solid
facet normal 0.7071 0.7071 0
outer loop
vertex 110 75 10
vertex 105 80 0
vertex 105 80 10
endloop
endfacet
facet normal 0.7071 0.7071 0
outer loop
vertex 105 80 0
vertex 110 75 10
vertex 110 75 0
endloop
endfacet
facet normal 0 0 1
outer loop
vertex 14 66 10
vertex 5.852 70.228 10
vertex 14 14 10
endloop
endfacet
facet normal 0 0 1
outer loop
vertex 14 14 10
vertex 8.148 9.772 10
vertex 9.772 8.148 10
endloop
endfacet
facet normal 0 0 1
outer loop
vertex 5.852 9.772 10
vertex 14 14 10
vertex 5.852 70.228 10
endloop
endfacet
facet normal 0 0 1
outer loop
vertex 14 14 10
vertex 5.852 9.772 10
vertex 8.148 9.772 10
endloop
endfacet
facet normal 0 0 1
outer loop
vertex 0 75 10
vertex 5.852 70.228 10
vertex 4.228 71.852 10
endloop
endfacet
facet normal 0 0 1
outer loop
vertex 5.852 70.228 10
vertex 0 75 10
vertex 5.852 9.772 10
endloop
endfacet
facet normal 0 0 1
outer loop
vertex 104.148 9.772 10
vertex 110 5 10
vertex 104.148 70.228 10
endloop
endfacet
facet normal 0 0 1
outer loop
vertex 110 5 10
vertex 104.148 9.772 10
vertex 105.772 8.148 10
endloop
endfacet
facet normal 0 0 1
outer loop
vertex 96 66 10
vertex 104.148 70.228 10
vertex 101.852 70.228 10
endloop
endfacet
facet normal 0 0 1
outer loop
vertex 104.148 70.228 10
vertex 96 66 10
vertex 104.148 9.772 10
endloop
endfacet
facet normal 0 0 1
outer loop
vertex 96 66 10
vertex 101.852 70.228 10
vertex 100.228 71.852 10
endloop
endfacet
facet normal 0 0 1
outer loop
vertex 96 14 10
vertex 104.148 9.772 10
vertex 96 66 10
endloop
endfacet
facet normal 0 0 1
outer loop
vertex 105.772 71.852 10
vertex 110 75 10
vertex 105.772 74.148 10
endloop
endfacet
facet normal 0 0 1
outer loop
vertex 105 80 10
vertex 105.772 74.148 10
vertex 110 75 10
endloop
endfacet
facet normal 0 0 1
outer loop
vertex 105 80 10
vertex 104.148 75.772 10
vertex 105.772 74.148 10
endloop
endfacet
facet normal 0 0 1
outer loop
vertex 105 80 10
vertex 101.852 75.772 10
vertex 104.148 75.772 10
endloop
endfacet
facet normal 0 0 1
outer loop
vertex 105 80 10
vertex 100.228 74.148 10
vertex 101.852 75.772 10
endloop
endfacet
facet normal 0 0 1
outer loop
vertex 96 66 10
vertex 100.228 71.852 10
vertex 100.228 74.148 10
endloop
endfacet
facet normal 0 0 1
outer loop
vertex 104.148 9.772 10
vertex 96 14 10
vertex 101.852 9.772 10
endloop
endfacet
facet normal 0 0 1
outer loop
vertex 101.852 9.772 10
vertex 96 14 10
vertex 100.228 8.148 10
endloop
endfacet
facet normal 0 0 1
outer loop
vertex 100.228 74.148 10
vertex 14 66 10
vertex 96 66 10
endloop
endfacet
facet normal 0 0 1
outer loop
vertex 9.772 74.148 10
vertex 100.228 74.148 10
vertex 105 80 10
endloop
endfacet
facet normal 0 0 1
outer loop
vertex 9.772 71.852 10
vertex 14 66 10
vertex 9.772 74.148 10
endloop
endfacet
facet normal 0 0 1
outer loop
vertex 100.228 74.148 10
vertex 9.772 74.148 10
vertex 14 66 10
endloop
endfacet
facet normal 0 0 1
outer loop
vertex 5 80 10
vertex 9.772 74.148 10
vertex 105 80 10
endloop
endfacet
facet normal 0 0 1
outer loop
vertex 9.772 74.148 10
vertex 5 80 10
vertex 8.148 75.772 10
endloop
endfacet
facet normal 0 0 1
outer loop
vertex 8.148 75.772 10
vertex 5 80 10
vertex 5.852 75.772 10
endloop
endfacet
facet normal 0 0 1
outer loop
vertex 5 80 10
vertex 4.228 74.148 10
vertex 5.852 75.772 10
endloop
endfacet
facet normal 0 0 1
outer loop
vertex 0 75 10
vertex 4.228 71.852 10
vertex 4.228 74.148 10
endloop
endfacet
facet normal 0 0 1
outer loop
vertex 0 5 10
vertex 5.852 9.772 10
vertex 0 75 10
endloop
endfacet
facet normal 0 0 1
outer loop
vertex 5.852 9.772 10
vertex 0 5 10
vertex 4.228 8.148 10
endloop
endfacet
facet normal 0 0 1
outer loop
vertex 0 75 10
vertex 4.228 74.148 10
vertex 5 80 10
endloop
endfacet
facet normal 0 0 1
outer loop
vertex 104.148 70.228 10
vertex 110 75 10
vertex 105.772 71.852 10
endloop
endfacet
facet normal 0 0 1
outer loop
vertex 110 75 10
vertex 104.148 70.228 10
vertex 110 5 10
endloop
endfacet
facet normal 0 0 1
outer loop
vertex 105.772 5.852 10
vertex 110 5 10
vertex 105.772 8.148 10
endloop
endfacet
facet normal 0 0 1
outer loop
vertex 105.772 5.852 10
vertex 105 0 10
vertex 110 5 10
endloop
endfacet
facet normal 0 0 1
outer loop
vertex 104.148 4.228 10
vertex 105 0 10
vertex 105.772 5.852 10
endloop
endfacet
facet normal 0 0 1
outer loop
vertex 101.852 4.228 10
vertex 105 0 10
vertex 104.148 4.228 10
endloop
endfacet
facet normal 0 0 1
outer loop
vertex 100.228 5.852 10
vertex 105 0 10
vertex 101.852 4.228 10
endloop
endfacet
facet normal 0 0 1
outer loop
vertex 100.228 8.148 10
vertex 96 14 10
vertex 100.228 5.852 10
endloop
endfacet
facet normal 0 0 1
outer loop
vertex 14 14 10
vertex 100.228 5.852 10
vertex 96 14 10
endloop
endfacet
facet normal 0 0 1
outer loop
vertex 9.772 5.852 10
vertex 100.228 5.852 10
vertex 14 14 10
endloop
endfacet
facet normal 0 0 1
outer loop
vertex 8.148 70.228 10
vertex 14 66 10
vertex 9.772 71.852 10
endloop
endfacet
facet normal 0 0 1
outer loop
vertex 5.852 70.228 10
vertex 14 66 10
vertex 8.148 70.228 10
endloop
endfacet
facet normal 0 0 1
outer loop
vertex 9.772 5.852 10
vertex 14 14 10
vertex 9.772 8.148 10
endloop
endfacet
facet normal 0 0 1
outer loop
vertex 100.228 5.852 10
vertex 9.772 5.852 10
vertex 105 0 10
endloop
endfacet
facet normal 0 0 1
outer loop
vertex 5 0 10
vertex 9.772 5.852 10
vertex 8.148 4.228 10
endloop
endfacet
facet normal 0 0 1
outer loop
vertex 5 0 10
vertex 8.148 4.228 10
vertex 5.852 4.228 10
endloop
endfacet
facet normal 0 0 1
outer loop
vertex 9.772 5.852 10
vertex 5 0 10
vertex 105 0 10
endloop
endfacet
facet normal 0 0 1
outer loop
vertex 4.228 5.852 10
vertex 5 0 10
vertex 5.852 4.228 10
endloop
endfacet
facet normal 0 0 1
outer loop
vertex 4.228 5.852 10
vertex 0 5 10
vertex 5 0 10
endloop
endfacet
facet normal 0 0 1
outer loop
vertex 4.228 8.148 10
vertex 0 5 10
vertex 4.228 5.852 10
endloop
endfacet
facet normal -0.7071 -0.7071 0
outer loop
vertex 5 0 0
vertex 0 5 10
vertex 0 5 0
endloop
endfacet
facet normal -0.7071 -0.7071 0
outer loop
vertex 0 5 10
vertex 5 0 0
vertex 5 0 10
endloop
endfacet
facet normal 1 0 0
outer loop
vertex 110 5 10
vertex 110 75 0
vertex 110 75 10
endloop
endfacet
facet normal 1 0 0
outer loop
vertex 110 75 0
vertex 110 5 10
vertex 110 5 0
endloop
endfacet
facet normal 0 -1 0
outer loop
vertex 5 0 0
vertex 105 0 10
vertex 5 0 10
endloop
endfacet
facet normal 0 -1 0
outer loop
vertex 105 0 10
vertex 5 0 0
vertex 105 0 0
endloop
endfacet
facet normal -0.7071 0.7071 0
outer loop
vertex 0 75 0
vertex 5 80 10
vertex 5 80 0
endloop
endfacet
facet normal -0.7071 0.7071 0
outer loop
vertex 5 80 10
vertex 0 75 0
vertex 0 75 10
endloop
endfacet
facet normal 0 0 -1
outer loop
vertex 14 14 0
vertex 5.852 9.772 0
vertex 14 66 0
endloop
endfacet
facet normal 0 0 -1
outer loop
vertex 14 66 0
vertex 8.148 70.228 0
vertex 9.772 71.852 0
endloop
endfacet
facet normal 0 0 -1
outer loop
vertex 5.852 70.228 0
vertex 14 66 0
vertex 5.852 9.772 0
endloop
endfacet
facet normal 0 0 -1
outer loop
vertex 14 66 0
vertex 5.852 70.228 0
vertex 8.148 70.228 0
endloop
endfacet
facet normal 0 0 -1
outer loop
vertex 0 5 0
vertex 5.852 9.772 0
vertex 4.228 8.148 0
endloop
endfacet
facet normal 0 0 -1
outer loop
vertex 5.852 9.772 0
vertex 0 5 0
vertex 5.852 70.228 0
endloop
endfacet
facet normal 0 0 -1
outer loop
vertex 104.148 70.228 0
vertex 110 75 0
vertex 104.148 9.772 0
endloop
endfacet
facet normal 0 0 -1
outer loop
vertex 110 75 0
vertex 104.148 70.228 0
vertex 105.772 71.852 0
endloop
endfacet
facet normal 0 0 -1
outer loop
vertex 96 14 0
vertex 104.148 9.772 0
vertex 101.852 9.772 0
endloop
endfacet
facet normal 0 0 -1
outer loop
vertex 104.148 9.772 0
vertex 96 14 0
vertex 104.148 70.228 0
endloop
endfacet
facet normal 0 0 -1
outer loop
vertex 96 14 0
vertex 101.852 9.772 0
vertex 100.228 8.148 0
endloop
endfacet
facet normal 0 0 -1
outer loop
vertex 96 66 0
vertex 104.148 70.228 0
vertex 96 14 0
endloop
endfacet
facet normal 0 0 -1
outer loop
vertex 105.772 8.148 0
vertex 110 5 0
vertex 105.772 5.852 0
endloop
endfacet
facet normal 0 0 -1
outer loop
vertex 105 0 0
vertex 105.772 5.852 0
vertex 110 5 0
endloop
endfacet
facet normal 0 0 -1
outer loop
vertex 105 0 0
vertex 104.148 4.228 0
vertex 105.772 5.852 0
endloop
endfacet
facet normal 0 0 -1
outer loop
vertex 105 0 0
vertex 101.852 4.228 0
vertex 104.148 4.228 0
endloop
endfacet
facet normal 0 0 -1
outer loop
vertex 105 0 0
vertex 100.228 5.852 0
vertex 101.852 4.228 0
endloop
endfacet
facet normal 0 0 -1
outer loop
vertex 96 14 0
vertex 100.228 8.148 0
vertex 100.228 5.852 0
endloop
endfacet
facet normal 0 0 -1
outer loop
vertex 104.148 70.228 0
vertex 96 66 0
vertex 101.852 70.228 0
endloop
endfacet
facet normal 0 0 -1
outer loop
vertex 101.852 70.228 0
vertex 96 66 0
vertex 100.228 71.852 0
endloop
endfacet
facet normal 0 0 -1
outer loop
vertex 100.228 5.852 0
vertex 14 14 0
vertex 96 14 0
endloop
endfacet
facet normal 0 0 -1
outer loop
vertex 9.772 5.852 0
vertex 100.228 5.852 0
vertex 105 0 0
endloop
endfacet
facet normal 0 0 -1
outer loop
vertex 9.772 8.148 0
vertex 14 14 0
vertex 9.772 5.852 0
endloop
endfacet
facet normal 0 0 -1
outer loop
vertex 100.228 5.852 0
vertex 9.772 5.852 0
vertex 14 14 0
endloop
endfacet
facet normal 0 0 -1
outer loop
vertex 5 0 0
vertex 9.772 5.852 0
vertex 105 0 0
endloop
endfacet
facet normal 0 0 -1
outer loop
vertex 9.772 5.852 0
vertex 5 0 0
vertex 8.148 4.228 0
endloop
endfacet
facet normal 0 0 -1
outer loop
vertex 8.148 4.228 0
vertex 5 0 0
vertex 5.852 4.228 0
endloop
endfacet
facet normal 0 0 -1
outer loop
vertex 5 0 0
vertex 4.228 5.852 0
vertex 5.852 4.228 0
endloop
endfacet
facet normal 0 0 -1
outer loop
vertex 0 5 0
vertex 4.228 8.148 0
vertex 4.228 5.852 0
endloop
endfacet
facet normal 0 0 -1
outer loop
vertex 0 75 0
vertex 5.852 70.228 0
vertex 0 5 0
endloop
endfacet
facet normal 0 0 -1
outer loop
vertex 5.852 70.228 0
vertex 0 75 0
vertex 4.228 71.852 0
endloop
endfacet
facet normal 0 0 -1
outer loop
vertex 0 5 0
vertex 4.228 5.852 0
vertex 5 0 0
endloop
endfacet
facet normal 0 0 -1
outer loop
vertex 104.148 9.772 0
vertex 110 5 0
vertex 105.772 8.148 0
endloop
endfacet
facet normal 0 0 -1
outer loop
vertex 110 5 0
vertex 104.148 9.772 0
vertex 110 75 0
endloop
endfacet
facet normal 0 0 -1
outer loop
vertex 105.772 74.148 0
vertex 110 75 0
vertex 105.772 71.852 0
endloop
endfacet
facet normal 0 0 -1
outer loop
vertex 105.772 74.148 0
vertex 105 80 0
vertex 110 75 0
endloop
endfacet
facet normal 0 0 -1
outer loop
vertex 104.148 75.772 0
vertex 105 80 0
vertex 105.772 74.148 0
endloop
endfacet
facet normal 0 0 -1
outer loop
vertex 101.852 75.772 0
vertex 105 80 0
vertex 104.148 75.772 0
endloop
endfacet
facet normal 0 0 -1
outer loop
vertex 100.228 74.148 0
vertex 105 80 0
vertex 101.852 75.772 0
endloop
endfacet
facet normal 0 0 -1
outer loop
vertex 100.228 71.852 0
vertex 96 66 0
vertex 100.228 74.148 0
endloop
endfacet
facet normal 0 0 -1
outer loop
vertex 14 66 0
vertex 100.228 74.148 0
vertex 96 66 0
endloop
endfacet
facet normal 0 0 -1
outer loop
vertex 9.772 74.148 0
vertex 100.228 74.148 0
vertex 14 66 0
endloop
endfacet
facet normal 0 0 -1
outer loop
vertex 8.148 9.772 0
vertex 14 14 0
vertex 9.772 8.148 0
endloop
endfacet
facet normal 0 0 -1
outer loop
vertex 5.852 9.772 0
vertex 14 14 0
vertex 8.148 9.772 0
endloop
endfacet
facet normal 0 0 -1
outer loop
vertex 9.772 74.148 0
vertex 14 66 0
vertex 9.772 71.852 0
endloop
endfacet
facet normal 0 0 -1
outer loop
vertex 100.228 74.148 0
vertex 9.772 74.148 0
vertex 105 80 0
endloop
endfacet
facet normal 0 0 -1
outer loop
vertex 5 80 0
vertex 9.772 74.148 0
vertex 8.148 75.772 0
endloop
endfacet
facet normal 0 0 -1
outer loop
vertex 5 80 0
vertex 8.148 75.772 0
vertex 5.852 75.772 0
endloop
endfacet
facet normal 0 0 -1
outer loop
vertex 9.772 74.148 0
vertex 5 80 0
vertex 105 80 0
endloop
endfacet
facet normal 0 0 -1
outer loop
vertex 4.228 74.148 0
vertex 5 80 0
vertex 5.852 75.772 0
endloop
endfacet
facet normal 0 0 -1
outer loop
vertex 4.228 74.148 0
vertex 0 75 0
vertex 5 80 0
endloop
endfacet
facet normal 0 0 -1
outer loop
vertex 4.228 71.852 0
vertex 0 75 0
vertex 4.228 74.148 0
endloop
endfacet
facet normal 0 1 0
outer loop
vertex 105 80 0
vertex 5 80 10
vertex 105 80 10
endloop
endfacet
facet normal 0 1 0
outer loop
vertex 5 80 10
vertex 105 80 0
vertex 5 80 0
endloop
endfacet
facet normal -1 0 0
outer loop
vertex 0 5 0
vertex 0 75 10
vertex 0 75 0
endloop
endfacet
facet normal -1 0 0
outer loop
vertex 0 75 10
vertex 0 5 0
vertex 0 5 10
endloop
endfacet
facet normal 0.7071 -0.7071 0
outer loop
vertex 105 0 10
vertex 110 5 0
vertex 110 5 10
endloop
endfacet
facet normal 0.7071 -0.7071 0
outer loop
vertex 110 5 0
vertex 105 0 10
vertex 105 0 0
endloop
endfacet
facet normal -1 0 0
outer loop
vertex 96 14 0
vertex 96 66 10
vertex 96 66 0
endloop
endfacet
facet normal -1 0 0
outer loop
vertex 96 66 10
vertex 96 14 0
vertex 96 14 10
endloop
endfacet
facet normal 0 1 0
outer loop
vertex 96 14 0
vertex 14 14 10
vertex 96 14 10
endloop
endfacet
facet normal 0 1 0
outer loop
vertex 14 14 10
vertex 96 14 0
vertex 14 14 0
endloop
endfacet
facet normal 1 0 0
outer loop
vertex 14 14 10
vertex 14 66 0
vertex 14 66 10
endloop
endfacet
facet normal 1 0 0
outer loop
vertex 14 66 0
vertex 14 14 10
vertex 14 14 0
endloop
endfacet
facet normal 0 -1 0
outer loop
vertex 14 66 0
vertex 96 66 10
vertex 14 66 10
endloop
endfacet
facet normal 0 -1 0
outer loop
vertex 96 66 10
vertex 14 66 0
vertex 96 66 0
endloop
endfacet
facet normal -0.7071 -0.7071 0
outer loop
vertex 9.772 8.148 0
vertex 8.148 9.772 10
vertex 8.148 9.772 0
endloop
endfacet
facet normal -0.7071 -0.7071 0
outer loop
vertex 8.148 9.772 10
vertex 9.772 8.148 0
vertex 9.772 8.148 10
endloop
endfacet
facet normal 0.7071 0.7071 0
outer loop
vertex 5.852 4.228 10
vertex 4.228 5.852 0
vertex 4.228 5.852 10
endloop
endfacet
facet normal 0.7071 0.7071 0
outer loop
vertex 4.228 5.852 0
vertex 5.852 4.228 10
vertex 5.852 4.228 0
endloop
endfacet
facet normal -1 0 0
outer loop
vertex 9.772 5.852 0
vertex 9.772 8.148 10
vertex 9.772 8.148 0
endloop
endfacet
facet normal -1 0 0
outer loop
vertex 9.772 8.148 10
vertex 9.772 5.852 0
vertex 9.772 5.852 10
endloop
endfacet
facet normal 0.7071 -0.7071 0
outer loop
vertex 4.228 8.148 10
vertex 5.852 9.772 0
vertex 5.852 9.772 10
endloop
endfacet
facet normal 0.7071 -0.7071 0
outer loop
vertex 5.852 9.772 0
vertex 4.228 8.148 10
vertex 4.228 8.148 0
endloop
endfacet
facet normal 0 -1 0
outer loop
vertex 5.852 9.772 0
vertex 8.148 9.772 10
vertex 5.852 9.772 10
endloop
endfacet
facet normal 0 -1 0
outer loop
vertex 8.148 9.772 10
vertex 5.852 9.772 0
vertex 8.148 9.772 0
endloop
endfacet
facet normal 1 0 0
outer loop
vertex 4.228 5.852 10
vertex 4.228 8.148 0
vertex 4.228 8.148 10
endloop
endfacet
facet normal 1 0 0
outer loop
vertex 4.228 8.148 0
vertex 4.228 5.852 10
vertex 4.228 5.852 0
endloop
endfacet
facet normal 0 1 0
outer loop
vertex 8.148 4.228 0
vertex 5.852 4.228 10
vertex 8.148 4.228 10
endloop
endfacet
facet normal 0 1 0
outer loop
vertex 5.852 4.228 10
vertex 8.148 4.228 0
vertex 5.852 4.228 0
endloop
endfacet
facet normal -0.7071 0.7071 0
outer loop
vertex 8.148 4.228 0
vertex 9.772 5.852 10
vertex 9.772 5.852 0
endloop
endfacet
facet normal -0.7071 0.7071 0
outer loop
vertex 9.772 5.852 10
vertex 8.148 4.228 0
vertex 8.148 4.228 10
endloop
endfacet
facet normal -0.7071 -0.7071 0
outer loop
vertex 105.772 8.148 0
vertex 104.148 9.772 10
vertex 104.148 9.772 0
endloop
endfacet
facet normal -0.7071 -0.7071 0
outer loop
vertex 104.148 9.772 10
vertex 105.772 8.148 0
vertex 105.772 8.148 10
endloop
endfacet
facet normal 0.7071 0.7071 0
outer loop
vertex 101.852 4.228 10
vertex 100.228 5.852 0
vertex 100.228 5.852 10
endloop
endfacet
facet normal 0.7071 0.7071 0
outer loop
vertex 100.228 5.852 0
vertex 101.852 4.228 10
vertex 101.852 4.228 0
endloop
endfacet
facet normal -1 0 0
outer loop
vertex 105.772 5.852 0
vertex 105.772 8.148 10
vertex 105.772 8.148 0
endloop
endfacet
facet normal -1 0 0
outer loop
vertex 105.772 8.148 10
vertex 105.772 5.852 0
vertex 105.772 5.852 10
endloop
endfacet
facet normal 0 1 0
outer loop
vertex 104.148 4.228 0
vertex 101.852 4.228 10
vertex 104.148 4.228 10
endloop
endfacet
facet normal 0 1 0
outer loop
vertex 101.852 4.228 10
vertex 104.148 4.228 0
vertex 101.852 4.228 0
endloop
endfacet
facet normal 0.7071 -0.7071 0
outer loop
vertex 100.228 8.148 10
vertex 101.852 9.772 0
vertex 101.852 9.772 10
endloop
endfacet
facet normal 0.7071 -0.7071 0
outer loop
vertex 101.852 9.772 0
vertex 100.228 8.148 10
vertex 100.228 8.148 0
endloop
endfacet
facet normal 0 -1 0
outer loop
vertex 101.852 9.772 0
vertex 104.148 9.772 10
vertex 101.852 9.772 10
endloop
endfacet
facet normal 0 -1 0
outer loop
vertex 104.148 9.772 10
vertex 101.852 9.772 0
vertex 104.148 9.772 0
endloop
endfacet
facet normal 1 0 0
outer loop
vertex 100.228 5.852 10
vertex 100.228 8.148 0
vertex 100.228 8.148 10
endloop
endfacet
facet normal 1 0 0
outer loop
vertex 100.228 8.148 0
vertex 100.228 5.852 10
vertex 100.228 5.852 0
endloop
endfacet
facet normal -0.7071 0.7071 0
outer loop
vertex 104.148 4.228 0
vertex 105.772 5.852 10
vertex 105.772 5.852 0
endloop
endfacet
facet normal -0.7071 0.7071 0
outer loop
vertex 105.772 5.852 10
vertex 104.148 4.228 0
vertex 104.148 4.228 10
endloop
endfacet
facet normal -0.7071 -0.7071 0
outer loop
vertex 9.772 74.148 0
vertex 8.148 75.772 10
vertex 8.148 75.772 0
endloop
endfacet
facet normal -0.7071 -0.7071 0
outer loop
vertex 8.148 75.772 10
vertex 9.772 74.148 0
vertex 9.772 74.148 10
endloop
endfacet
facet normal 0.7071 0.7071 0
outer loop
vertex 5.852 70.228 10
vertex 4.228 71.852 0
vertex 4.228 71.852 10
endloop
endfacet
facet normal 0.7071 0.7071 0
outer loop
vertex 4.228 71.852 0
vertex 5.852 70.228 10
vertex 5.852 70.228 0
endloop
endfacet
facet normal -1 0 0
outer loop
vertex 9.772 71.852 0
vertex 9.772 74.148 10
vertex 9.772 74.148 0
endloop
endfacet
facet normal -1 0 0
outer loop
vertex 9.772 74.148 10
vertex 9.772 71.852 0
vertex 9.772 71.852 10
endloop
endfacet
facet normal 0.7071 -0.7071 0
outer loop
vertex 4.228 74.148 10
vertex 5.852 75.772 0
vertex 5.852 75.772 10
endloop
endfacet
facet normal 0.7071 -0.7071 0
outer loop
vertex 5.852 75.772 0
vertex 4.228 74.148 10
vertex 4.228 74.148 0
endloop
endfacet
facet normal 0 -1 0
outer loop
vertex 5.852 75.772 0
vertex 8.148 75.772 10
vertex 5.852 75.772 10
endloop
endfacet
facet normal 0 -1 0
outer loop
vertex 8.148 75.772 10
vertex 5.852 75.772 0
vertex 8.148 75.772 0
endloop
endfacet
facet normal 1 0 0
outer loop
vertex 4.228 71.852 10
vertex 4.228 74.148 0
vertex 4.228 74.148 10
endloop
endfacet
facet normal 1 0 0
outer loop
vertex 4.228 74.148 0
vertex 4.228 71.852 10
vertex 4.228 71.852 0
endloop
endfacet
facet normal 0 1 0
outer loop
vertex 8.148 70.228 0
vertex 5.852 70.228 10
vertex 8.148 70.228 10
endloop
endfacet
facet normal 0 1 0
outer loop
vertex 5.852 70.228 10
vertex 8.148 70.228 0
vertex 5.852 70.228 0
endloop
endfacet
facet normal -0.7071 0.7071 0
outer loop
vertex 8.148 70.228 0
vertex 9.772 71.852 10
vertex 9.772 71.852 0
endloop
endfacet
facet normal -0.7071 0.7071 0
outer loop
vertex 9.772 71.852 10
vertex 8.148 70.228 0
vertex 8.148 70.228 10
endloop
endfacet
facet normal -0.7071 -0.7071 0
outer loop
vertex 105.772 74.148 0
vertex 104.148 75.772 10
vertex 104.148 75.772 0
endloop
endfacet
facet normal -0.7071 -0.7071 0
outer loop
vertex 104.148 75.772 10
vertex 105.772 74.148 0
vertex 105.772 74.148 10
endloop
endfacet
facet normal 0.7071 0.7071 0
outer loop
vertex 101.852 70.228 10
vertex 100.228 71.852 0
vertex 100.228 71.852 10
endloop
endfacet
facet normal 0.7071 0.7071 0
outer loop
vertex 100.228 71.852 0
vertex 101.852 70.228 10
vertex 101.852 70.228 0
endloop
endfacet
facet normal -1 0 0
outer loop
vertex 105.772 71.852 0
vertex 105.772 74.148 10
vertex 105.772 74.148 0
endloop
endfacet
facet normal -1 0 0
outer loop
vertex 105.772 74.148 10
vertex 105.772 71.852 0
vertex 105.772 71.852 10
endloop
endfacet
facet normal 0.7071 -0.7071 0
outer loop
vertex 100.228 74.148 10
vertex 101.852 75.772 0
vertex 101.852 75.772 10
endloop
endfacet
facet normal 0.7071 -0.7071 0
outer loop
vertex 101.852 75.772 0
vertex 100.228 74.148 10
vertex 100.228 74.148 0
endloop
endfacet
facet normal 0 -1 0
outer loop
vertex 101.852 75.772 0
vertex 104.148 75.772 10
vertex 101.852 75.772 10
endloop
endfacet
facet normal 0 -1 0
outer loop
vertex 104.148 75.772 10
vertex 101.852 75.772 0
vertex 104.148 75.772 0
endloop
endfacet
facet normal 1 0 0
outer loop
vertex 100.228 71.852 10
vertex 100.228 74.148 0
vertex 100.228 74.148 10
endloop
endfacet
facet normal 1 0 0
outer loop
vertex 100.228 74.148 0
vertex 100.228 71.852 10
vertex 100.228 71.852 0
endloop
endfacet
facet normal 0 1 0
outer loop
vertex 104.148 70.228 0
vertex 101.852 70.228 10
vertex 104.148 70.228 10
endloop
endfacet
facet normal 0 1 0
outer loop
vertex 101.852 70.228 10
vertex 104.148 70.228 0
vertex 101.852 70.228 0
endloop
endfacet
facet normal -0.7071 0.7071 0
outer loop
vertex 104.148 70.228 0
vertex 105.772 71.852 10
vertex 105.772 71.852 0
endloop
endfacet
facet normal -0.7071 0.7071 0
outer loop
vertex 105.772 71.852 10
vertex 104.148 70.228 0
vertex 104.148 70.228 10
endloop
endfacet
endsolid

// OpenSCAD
$fn = 32;

// ----------------------------------------------------------------------
// Frame plate: 110 x 80 frame, 14 mm rails
// ----------------------------------------------------------------------

// --- parameters (mm) ---
plate_l = 110;            // plate length, X
plate_w = 80;             // plate width, Y
plate_t = 10;             // plate thickness, Z (extrusion height)
corner_c = 5;             // corner chamfer
frame_bar = 14;           // frame rail width
bolt_r = 3;               // corner bolt window radius
bolt_inset = 7;           // bolt centre inset from the edges

win_l = plate_l - 2 * frame_bar;  // window length
win_w = plate_w - 2 * frame_bar;  // window width
bolt_d = 2 * bolt_r;  // corner hole diameter

profile = [[5, 0], [105, 0], [110, 5], [110, 75], [105, 80], [5, 80], [0, 75], [0, 5]];  // primary outline, 8 points, counter clockwise
void_1 = [[14, 14], [96, 14], [96, 66], [14, 66]];  // the window, 4 points
void_2 = [[9.772, 8.148], [8.148, 9.772], [5.852, 9.772], [4.228, 8.148], [4.228, 5.852], [5.852, 4.228], [8.148, 4.228], [9.772, 5.852]];  // corner bolt window, 8 points
void_3 = [[105.772, 8.148], [104.148, 9.772], [101.852, 9.772], [100.228, 8.148], [100.228, 5.852], [101.852, 4.228], [104.148, 4.228], [105.772, 5.852]];  // corner bolt window, 8 points
void_4 = [[9.772, 74.148], [8.148, 75.772], [5.852, 75.772], [4.228, 74.148], [4.228, 71.852], [5.852, 70.228], [8.148, 70.228], [9.772, 71.852]];  // corner bolt window, 8 points
void_5 = [[105.772, 74.148], [104.148, 75.772], [101.852, 75.772], [100.228, 74.148], [100.228, 71.852], [101.852, 70.228], [104.148, 70.228], [105.772, 71.852]];  // corner bolt window, 8 points

// --- the one profile operation ---
difference() {
  linear_extrude(height = plate_t) polygon(points = profile);
  translate([0, 0, -1])
    linear_extrude(height = plate_t + 2) polygon(points = void_1);
  translate([0, 0, -1])
    linear_extrude(height = plate_t + 2) polygon(points = void_2);
  translate([0, 0, -1])
    linear_extrude(height = plate_t + 2) polygon(points = void_3);
  translate([0, 0, -1])
    linear_extrude(height = plate_t + 2) polygon(points = void_4);
  translate([0, 0, -1])
    linear_extrude(height = plate_t + 2) polygon(points = void_5);
}
